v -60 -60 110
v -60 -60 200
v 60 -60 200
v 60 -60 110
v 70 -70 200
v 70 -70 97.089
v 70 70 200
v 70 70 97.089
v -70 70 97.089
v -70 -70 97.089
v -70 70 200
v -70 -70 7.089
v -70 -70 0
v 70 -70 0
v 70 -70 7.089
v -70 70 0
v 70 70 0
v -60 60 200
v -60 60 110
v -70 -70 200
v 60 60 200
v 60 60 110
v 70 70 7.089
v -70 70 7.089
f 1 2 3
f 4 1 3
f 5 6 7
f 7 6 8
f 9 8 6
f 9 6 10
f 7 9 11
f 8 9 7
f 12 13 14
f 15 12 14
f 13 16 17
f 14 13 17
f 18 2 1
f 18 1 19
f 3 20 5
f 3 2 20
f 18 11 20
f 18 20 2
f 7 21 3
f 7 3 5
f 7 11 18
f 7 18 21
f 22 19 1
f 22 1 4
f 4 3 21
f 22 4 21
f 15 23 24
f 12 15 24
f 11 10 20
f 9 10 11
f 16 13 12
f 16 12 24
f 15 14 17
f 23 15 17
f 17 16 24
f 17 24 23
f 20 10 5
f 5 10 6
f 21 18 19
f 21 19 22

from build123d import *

# Parameters (mm, degrees)
F0_W     = 140
F0_H     = 140
F1_DEPTH = 200
F3_W     = 140
F3_H     = 90
F4_DEPTH = 190
F5_W     = 120
F5_H     = 120
F6_DEPTH = 90


with BuildPart() as f1:
    # F0 (on Top) → F1 (new body)
    with BuildSketch(Plane.XY):
        Rectangle(F0_W, F0_H)
    extrude(amount=F1_DEPTH)

    # F3 (on face) → F4 (cut)
    with BuildSketch(Plane(origin=(0, 70, 0), x_dir=(-1, 0, 0), z_dir=(0, 1, 0))):
        with Locations((0, 52.08874)):
            Rectangle(F3_W, F3_H)
    extrude(amount=-F4_DEPTH, mode=Mode.SUBTRACT)

    # F5 (on face) → F6 (cut)
    with BuildSketch(Plane.XY.offset(200)):
        Rectangle(F5_W, F5_H)
    extrude(amount=-F6_DEPTH, mode=Mode.SUBTRACT)


solid = f1.part
